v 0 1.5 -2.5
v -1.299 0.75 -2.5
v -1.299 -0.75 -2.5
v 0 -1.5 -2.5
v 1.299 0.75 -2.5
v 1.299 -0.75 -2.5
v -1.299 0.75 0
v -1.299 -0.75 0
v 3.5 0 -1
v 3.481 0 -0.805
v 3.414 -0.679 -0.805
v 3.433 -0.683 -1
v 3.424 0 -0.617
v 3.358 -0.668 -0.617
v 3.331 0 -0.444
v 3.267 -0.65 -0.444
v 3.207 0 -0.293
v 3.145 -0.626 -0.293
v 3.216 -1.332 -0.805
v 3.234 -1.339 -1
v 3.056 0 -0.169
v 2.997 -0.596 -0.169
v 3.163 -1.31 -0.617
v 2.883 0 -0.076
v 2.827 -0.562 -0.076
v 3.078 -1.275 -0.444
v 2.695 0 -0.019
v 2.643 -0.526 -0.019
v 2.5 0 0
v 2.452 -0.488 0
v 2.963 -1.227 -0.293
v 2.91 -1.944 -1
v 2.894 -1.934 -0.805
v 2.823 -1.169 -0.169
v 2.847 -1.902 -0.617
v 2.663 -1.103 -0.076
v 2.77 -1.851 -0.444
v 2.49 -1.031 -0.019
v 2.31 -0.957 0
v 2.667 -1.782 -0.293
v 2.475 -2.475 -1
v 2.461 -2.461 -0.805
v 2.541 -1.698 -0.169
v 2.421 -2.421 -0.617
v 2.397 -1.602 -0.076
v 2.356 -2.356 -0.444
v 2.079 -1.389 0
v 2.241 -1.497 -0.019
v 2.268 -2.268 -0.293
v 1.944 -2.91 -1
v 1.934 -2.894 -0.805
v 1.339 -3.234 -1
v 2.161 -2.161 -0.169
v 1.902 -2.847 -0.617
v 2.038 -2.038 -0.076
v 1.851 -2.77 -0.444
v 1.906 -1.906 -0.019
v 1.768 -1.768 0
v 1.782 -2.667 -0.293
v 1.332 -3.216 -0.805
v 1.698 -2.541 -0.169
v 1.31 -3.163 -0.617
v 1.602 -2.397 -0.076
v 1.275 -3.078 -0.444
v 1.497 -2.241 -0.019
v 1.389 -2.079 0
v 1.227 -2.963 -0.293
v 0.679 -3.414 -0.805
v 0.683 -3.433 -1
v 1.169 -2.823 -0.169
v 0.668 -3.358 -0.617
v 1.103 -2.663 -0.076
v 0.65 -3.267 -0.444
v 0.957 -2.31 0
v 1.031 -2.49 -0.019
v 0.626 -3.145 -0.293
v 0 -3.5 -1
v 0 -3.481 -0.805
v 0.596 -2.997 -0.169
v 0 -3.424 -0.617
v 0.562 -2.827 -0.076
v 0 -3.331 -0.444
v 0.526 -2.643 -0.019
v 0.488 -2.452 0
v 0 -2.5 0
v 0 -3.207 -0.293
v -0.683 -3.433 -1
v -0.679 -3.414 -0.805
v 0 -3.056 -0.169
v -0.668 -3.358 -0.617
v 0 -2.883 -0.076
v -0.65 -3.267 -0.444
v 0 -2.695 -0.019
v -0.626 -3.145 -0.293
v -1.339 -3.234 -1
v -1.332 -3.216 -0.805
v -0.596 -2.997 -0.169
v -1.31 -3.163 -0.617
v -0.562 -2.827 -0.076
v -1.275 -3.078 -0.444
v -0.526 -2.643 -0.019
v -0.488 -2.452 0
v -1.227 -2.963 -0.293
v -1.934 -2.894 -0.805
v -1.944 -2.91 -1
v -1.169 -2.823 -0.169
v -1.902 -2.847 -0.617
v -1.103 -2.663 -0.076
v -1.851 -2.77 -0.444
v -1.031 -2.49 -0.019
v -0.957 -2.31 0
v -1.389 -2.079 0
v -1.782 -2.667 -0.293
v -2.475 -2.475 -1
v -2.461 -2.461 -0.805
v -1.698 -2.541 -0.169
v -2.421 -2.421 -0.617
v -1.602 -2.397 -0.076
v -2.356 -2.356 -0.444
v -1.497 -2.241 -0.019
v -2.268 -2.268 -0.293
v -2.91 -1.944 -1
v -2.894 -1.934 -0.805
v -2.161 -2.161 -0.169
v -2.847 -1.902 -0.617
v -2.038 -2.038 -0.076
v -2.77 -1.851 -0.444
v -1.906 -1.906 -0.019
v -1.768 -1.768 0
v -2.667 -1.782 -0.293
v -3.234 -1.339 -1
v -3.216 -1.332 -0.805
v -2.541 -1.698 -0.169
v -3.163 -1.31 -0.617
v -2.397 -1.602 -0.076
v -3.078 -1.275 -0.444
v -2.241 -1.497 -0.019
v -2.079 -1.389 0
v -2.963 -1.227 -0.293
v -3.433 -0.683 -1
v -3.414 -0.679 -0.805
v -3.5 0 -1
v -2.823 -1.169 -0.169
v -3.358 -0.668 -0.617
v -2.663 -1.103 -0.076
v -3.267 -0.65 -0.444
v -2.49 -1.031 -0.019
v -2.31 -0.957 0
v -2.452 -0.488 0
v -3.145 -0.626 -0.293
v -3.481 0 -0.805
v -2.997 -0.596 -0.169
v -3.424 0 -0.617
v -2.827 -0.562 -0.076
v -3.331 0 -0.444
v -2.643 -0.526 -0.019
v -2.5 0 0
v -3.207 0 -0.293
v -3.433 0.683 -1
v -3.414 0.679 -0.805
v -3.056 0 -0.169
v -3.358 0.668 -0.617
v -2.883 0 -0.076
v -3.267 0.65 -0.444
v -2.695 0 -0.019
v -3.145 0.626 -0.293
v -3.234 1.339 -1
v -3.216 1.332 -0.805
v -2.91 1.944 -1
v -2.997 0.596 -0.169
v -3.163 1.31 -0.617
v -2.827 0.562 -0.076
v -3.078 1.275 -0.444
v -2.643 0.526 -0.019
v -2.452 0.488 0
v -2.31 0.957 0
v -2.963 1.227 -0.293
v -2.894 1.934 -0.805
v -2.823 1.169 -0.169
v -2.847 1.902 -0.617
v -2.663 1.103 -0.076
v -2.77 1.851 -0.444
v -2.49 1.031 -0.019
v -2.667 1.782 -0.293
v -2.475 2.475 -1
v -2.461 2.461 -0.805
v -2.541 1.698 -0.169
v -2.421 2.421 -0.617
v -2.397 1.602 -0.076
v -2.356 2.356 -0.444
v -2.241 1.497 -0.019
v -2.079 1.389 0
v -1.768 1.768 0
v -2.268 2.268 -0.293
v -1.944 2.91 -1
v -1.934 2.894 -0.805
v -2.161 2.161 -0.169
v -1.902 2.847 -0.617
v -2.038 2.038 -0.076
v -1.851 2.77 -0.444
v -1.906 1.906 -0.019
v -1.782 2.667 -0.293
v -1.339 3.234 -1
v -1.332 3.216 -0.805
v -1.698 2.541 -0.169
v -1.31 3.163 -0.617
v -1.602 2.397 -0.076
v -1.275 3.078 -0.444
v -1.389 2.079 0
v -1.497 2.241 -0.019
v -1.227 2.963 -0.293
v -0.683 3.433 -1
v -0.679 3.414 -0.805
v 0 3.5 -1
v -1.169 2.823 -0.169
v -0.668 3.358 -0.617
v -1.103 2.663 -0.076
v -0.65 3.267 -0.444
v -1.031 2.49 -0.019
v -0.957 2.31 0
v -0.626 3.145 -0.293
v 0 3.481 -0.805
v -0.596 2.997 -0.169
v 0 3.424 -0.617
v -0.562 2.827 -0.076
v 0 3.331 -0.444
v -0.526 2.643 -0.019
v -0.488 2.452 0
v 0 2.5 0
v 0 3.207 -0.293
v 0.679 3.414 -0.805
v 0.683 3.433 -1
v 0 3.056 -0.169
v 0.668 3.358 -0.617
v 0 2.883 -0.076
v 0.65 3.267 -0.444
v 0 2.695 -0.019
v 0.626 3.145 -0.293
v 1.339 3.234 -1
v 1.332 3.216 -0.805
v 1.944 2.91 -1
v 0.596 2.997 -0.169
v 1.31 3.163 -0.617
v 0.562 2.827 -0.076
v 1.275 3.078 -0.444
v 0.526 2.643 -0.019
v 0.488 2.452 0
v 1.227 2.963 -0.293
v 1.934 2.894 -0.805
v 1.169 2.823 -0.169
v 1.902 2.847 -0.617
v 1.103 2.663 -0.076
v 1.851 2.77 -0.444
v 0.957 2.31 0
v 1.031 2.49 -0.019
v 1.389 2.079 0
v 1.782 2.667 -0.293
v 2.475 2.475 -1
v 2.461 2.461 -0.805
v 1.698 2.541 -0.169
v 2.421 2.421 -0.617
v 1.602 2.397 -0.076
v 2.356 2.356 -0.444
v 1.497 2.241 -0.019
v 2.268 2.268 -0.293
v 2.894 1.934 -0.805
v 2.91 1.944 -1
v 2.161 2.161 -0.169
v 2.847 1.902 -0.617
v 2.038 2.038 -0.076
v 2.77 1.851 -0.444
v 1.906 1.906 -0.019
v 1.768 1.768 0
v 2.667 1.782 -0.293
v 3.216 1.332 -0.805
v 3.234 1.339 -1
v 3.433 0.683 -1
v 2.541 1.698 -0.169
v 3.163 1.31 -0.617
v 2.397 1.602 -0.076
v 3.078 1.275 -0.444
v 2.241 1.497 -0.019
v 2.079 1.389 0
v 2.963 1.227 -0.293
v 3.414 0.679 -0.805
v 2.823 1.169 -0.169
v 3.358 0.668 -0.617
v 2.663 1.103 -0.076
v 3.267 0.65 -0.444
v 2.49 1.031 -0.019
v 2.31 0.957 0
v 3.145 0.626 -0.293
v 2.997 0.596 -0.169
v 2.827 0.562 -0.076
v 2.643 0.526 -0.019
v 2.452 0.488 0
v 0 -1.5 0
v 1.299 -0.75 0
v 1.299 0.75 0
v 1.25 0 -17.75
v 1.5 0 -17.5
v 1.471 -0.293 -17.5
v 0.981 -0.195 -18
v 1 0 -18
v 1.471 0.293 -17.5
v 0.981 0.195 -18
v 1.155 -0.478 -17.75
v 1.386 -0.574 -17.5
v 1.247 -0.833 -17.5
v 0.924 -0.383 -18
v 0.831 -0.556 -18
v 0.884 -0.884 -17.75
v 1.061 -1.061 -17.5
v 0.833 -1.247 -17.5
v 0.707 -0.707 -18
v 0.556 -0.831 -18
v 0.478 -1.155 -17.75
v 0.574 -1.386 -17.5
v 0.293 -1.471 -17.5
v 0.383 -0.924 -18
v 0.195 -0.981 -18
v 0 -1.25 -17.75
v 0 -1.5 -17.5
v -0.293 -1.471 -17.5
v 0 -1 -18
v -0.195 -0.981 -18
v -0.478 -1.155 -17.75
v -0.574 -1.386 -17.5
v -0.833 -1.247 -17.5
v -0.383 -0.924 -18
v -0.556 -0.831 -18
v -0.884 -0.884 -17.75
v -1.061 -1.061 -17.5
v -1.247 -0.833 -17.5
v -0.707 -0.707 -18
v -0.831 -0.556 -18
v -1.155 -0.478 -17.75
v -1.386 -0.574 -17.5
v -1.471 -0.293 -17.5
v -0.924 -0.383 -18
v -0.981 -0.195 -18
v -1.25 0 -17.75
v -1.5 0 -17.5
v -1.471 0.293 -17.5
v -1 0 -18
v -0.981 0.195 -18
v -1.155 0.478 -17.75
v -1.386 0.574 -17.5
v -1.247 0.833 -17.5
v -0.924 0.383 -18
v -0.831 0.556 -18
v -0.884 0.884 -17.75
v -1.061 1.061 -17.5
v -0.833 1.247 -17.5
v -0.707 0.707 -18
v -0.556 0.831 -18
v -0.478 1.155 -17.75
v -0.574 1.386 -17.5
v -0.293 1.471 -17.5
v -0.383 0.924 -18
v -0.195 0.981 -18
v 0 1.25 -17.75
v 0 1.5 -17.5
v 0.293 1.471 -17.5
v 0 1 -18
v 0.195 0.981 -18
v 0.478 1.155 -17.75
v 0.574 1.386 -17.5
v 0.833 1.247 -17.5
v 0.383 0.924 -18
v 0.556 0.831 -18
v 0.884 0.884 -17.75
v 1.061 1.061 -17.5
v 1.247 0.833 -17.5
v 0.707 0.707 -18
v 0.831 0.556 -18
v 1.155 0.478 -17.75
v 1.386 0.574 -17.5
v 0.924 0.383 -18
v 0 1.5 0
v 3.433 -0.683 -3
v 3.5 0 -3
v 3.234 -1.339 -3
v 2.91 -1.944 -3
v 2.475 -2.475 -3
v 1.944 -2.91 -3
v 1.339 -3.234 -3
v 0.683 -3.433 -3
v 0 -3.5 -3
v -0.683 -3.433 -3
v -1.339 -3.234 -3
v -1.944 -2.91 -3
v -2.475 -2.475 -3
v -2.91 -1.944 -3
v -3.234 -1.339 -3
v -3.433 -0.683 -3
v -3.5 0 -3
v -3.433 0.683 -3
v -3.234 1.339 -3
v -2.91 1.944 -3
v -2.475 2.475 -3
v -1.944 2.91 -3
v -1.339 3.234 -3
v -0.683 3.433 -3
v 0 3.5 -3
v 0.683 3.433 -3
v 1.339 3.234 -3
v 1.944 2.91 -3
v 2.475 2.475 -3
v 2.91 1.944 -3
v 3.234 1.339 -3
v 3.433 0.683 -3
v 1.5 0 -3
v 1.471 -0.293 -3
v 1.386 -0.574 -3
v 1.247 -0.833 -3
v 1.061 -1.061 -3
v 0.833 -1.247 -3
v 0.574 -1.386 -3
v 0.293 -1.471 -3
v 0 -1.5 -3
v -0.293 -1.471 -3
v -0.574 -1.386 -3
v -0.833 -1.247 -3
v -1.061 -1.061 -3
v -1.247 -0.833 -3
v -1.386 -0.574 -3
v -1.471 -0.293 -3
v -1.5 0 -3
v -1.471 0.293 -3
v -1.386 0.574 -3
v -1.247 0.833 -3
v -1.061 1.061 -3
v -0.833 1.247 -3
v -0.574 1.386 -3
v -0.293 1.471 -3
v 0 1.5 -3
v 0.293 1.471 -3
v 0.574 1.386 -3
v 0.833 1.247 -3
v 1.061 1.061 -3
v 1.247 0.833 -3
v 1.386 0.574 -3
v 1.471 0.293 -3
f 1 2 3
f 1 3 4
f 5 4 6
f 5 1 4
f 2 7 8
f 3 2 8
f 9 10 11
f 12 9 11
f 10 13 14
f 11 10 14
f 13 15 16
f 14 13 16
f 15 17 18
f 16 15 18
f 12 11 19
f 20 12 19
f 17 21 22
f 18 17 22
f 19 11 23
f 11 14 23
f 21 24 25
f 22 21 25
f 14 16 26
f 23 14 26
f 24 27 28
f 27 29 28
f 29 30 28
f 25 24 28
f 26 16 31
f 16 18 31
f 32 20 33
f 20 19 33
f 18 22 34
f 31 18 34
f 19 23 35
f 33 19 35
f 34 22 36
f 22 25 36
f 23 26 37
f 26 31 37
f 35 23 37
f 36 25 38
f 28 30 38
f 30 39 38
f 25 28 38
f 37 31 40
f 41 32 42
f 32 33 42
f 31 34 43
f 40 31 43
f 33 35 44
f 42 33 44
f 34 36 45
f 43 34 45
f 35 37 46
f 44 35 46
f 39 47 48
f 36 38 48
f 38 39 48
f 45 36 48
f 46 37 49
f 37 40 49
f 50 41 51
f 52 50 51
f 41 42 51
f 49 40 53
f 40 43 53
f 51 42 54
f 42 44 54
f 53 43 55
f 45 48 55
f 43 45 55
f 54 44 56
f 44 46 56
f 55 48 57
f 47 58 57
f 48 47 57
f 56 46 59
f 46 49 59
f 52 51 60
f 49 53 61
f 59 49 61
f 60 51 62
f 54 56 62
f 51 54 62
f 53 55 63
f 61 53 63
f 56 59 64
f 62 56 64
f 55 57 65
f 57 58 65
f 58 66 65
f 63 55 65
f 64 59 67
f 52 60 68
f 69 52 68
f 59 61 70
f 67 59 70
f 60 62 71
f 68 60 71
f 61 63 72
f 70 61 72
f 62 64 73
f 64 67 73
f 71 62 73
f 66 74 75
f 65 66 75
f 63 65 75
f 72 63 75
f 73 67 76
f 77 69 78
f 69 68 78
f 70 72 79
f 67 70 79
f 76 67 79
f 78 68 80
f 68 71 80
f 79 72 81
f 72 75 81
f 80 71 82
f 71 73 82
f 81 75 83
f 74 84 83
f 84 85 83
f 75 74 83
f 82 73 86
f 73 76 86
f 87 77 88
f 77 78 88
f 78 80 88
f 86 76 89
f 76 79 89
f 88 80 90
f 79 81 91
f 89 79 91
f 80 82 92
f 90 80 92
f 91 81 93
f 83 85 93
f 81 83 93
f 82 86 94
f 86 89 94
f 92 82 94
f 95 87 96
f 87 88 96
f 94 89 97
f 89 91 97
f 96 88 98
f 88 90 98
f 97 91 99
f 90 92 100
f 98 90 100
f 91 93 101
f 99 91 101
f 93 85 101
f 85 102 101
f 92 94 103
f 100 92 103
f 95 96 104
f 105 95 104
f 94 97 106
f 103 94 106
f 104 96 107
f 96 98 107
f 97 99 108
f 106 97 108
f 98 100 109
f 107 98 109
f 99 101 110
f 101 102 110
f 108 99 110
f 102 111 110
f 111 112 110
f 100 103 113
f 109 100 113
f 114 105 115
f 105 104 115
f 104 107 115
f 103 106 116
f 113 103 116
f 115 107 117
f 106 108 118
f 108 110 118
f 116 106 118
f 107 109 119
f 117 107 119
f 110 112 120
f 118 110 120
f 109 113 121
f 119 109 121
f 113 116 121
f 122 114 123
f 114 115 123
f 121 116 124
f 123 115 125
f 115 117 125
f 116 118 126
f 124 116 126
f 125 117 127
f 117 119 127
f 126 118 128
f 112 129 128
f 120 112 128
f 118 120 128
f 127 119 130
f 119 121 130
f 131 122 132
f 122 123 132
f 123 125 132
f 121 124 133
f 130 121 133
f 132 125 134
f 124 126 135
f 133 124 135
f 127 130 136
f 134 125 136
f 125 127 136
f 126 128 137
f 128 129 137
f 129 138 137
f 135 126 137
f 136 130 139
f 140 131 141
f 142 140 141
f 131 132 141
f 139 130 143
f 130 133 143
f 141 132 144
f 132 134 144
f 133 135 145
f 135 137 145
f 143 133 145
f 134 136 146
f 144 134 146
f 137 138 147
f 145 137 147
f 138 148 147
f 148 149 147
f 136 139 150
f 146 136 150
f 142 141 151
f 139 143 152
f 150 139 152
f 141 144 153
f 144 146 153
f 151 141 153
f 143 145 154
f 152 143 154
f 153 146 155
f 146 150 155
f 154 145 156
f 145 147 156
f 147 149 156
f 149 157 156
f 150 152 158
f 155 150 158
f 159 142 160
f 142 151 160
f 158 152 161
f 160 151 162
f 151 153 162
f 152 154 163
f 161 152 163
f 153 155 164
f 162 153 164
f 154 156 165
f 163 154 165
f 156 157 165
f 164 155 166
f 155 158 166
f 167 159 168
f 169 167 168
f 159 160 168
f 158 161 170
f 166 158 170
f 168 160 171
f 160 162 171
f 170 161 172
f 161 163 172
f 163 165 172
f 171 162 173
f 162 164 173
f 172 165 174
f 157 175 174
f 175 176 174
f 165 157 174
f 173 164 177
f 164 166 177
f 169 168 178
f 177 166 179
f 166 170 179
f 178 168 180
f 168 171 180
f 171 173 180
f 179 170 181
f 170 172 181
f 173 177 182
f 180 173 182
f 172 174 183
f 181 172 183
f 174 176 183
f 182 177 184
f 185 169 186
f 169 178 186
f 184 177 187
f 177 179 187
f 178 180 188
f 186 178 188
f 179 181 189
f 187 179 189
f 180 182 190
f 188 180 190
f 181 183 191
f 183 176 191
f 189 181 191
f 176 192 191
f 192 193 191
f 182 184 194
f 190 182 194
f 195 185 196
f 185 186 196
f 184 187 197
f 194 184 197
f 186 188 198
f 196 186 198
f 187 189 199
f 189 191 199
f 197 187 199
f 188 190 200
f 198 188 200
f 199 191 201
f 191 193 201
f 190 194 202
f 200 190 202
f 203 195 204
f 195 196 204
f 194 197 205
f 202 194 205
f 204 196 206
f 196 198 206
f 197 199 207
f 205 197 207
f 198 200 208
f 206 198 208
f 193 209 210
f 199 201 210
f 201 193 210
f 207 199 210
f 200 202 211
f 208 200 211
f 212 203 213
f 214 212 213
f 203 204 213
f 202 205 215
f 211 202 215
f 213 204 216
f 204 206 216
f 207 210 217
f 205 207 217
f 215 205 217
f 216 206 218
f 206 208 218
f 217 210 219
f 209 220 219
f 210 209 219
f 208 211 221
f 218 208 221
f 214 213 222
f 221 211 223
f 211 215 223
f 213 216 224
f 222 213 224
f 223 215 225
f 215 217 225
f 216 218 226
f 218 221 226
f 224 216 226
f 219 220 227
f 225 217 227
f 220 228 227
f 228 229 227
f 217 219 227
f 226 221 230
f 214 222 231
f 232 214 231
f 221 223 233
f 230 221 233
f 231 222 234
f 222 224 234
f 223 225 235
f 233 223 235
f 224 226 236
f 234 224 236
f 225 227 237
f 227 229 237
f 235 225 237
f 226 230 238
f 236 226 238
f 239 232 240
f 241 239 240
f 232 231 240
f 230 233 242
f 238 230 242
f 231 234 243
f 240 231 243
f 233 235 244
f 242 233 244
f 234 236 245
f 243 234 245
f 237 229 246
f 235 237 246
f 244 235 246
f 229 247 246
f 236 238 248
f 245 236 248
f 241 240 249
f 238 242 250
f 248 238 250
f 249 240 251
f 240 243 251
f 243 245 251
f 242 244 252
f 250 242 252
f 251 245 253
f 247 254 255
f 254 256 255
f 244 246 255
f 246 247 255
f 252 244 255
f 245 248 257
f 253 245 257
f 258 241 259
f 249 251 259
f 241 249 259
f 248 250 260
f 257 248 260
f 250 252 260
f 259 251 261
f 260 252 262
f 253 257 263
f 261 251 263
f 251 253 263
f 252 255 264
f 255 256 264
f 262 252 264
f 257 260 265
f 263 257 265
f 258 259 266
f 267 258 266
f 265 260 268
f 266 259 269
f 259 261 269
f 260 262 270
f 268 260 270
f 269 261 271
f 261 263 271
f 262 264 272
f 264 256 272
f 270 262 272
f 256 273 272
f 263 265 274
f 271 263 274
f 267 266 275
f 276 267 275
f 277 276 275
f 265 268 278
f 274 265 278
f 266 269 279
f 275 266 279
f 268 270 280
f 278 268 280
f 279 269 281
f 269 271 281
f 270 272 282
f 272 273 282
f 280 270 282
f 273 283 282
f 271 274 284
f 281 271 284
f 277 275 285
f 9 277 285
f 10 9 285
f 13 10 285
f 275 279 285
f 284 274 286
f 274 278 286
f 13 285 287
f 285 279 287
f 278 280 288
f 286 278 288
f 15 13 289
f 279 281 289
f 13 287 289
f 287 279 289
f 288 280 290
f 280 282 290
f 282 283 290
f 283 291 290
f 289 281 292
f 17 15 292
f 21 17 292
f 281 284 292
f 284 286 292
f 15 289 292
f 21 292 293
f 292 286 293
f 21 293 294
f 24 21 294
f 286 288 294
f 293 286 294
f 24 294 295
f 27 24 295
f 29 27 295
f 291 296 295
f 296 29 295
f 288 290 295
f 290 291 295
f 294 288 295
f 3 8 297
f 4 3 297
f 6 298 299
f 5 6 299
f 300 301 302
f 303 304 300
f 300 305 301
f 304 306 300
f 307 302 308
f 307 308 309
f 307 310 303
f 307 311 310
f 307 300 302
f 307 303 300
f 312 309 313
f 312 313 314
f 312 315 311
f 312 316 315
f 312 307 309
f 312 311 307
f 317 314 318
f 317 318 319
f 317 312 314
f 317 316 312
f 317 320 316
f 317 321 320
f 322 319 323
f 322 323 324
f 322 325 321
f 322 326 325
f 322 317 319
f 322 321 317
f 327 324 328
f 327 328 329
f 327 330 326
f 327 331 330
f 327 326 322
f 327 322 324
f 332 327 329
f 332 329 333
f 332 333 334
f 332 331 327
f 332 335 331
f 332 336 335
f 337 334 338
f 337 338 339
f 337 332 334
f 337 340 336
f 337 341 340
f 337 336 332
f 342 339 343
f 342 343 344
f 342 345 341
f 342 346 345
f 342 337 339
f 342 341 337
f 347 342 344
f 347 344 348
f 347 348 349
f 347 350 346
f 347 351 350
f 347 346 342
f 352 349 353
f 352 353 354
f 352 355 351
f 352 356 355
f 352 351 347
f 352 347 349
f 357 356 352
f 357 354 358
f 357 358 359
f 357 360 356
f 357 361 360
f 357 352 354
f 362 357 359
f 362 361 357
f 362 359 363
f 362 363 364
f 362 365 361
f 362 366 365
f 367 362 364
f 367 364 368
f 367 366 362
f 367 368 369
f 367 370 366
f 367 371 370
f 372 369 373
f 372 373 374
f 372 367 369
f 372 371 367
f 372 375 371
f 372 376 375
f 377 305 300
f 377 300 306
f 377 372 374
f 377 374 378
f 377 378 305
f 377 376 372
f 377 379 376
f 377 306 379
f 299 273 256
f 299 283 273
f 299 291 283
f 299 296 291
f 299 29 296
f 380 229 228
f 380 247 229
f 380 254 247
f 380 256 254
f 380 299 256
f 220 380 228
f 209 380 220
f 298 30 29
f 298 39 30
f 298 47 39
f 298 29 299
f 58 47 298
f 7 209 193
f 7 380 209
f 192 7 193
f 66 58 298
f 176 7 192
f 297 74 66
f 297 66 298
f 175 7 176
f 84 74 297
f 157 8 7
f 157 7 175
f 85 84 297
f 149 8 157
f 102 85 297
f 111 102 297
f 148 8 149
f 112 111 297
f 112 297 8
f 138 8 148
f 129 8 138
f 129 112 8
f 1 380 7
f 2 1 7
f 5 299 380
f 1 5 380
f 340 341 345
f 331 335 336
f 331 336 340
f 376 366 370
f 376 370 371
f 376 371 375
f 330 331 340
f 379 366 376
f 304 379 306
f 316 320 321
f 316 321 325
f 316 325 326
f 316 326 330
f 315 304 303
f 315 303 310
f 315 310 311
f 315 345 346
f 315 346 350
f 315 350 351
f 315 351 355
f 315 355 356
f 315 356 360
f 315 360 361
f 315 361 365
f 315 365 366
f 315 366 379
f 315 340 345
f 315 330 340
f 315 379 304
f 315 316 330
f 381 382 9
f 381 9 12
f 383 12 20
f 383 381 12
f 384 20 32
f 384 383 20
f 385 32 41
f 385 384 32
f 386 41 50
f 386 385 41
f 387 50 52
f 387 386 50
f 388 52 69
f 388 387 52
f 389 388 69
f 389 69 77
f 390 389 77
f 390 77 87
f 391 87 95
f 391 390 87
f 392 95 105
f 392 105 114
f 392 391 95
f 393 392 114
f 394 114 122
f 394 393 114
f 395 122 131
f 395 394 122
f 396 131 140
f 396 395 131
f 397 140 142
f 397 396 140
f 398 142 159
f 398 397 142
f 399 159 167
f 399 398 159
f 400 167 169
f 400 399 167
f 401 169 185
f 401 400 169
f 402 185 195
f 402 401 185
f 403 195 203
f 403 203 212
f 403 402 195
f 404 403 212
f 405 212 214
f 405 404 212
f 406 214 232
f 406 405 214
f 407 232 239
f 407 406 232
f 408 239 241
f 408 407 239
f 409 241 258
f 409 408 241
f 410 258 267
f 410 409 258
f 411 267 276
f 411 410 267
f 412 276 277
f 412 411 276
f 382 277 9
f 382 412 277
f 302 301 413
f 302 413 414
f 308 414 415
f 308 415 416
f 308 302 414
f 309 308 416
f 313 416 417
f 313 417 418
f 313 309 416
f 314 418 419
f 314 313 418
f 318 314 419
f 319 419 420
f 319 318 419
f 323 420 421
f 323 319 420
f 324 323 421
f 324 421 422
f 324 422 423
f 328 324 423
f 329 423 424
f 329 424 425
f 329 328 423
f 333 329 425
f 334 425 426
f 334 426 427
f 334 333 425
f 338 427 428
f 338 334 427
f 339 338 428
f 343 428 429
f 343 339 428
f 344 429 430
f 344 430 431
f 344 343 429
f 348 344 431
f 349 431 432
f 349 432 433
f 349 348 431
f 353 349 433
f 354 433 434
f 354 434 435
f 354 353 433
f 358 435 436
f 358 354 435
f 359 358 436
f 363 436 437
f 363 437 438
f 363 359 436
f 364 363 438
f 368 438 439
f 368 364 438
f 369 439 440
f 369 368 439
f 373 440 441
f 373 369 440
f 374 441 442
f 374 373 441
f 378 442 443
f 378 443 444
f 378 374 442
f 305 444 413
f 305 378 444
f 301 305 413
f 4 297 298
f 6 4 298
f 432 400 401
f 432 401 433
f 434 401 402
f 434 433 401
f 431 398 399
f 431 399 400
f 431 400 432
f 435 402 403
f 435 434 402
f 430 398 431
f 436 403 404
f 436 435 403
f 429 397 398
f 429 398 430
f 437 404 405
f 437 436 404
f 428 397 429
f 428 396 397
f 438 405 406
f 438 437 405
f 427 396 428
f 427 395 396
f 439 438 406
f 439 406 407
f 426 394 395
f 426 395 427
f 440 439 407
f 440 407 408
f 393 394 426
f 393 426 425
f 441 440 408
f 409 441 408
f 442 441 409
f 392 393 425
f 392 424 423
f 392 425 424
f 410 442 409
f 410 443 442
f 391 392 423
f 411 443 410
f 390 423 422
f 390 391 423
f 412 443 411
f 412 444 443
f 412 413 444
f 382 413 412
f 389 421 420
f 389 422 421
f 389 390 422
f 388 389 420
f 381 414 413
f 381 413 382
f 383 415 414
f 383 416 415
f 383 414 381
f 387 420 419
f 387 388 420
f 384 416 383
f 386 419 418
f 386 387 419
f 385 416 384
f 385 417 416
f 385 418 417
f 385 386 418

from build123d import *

# Parameters (mm, degrees)
FOOTPRINT_DEPTH = 2.5
CHAMFER1_SIZE   = 0.5
FILLET1_R       = 1


with BuildPart() as part:
    # Sketch1 → Body (revolve)
    with BuildSketch(Plane(origin=(0, 0, 0), x_dir=(0, 0, -1), z_dir=(1, 0, 0)), mode=Mode.PRIVATE) as body_sk:
        Polygon((0, 0), (0, 3.5), (3, 3.5), (3, 1.5), (18, 1.5), (18, 0), align=None)
    revolve(body_sk.sketch.rotate(Axis((0, 0, 156.291575099), (0, 0, -1)), 90), axis=Axis((0, 0, 156.291575099), (0, 0, -1)))

    # Sketch2 → Footprint (cut)
    with BuildSketch(Plane.XY):
        Polygon((0, 1.5), (-1.299038106, 0.75), (-1.299038106, -0.75), (0, -1.5), (1.299038106, -0.75), (1.299038106, 0.75), align=None)
    extrude(amount=-FOOTPRINT_DEPTH, mode=Mode.SUBTRACT)

    # Chamfer1
    chamfer1_edges = [part.edges().sort_by_distance(p)[0] for p in [
        (-1.5, 0, -18),
    ]]
    chamfer(chamfer1_edges, length=CHAMFER1_SIZE)

    # Fillet1
    fillet1_edges = [part.edges().sort_by_distance(p)[0] for p in [
        (-3.5, 0, 0),
    ]]
    fillet(fillet1_edges, radius=FILLET1_R)


solid = part.part
